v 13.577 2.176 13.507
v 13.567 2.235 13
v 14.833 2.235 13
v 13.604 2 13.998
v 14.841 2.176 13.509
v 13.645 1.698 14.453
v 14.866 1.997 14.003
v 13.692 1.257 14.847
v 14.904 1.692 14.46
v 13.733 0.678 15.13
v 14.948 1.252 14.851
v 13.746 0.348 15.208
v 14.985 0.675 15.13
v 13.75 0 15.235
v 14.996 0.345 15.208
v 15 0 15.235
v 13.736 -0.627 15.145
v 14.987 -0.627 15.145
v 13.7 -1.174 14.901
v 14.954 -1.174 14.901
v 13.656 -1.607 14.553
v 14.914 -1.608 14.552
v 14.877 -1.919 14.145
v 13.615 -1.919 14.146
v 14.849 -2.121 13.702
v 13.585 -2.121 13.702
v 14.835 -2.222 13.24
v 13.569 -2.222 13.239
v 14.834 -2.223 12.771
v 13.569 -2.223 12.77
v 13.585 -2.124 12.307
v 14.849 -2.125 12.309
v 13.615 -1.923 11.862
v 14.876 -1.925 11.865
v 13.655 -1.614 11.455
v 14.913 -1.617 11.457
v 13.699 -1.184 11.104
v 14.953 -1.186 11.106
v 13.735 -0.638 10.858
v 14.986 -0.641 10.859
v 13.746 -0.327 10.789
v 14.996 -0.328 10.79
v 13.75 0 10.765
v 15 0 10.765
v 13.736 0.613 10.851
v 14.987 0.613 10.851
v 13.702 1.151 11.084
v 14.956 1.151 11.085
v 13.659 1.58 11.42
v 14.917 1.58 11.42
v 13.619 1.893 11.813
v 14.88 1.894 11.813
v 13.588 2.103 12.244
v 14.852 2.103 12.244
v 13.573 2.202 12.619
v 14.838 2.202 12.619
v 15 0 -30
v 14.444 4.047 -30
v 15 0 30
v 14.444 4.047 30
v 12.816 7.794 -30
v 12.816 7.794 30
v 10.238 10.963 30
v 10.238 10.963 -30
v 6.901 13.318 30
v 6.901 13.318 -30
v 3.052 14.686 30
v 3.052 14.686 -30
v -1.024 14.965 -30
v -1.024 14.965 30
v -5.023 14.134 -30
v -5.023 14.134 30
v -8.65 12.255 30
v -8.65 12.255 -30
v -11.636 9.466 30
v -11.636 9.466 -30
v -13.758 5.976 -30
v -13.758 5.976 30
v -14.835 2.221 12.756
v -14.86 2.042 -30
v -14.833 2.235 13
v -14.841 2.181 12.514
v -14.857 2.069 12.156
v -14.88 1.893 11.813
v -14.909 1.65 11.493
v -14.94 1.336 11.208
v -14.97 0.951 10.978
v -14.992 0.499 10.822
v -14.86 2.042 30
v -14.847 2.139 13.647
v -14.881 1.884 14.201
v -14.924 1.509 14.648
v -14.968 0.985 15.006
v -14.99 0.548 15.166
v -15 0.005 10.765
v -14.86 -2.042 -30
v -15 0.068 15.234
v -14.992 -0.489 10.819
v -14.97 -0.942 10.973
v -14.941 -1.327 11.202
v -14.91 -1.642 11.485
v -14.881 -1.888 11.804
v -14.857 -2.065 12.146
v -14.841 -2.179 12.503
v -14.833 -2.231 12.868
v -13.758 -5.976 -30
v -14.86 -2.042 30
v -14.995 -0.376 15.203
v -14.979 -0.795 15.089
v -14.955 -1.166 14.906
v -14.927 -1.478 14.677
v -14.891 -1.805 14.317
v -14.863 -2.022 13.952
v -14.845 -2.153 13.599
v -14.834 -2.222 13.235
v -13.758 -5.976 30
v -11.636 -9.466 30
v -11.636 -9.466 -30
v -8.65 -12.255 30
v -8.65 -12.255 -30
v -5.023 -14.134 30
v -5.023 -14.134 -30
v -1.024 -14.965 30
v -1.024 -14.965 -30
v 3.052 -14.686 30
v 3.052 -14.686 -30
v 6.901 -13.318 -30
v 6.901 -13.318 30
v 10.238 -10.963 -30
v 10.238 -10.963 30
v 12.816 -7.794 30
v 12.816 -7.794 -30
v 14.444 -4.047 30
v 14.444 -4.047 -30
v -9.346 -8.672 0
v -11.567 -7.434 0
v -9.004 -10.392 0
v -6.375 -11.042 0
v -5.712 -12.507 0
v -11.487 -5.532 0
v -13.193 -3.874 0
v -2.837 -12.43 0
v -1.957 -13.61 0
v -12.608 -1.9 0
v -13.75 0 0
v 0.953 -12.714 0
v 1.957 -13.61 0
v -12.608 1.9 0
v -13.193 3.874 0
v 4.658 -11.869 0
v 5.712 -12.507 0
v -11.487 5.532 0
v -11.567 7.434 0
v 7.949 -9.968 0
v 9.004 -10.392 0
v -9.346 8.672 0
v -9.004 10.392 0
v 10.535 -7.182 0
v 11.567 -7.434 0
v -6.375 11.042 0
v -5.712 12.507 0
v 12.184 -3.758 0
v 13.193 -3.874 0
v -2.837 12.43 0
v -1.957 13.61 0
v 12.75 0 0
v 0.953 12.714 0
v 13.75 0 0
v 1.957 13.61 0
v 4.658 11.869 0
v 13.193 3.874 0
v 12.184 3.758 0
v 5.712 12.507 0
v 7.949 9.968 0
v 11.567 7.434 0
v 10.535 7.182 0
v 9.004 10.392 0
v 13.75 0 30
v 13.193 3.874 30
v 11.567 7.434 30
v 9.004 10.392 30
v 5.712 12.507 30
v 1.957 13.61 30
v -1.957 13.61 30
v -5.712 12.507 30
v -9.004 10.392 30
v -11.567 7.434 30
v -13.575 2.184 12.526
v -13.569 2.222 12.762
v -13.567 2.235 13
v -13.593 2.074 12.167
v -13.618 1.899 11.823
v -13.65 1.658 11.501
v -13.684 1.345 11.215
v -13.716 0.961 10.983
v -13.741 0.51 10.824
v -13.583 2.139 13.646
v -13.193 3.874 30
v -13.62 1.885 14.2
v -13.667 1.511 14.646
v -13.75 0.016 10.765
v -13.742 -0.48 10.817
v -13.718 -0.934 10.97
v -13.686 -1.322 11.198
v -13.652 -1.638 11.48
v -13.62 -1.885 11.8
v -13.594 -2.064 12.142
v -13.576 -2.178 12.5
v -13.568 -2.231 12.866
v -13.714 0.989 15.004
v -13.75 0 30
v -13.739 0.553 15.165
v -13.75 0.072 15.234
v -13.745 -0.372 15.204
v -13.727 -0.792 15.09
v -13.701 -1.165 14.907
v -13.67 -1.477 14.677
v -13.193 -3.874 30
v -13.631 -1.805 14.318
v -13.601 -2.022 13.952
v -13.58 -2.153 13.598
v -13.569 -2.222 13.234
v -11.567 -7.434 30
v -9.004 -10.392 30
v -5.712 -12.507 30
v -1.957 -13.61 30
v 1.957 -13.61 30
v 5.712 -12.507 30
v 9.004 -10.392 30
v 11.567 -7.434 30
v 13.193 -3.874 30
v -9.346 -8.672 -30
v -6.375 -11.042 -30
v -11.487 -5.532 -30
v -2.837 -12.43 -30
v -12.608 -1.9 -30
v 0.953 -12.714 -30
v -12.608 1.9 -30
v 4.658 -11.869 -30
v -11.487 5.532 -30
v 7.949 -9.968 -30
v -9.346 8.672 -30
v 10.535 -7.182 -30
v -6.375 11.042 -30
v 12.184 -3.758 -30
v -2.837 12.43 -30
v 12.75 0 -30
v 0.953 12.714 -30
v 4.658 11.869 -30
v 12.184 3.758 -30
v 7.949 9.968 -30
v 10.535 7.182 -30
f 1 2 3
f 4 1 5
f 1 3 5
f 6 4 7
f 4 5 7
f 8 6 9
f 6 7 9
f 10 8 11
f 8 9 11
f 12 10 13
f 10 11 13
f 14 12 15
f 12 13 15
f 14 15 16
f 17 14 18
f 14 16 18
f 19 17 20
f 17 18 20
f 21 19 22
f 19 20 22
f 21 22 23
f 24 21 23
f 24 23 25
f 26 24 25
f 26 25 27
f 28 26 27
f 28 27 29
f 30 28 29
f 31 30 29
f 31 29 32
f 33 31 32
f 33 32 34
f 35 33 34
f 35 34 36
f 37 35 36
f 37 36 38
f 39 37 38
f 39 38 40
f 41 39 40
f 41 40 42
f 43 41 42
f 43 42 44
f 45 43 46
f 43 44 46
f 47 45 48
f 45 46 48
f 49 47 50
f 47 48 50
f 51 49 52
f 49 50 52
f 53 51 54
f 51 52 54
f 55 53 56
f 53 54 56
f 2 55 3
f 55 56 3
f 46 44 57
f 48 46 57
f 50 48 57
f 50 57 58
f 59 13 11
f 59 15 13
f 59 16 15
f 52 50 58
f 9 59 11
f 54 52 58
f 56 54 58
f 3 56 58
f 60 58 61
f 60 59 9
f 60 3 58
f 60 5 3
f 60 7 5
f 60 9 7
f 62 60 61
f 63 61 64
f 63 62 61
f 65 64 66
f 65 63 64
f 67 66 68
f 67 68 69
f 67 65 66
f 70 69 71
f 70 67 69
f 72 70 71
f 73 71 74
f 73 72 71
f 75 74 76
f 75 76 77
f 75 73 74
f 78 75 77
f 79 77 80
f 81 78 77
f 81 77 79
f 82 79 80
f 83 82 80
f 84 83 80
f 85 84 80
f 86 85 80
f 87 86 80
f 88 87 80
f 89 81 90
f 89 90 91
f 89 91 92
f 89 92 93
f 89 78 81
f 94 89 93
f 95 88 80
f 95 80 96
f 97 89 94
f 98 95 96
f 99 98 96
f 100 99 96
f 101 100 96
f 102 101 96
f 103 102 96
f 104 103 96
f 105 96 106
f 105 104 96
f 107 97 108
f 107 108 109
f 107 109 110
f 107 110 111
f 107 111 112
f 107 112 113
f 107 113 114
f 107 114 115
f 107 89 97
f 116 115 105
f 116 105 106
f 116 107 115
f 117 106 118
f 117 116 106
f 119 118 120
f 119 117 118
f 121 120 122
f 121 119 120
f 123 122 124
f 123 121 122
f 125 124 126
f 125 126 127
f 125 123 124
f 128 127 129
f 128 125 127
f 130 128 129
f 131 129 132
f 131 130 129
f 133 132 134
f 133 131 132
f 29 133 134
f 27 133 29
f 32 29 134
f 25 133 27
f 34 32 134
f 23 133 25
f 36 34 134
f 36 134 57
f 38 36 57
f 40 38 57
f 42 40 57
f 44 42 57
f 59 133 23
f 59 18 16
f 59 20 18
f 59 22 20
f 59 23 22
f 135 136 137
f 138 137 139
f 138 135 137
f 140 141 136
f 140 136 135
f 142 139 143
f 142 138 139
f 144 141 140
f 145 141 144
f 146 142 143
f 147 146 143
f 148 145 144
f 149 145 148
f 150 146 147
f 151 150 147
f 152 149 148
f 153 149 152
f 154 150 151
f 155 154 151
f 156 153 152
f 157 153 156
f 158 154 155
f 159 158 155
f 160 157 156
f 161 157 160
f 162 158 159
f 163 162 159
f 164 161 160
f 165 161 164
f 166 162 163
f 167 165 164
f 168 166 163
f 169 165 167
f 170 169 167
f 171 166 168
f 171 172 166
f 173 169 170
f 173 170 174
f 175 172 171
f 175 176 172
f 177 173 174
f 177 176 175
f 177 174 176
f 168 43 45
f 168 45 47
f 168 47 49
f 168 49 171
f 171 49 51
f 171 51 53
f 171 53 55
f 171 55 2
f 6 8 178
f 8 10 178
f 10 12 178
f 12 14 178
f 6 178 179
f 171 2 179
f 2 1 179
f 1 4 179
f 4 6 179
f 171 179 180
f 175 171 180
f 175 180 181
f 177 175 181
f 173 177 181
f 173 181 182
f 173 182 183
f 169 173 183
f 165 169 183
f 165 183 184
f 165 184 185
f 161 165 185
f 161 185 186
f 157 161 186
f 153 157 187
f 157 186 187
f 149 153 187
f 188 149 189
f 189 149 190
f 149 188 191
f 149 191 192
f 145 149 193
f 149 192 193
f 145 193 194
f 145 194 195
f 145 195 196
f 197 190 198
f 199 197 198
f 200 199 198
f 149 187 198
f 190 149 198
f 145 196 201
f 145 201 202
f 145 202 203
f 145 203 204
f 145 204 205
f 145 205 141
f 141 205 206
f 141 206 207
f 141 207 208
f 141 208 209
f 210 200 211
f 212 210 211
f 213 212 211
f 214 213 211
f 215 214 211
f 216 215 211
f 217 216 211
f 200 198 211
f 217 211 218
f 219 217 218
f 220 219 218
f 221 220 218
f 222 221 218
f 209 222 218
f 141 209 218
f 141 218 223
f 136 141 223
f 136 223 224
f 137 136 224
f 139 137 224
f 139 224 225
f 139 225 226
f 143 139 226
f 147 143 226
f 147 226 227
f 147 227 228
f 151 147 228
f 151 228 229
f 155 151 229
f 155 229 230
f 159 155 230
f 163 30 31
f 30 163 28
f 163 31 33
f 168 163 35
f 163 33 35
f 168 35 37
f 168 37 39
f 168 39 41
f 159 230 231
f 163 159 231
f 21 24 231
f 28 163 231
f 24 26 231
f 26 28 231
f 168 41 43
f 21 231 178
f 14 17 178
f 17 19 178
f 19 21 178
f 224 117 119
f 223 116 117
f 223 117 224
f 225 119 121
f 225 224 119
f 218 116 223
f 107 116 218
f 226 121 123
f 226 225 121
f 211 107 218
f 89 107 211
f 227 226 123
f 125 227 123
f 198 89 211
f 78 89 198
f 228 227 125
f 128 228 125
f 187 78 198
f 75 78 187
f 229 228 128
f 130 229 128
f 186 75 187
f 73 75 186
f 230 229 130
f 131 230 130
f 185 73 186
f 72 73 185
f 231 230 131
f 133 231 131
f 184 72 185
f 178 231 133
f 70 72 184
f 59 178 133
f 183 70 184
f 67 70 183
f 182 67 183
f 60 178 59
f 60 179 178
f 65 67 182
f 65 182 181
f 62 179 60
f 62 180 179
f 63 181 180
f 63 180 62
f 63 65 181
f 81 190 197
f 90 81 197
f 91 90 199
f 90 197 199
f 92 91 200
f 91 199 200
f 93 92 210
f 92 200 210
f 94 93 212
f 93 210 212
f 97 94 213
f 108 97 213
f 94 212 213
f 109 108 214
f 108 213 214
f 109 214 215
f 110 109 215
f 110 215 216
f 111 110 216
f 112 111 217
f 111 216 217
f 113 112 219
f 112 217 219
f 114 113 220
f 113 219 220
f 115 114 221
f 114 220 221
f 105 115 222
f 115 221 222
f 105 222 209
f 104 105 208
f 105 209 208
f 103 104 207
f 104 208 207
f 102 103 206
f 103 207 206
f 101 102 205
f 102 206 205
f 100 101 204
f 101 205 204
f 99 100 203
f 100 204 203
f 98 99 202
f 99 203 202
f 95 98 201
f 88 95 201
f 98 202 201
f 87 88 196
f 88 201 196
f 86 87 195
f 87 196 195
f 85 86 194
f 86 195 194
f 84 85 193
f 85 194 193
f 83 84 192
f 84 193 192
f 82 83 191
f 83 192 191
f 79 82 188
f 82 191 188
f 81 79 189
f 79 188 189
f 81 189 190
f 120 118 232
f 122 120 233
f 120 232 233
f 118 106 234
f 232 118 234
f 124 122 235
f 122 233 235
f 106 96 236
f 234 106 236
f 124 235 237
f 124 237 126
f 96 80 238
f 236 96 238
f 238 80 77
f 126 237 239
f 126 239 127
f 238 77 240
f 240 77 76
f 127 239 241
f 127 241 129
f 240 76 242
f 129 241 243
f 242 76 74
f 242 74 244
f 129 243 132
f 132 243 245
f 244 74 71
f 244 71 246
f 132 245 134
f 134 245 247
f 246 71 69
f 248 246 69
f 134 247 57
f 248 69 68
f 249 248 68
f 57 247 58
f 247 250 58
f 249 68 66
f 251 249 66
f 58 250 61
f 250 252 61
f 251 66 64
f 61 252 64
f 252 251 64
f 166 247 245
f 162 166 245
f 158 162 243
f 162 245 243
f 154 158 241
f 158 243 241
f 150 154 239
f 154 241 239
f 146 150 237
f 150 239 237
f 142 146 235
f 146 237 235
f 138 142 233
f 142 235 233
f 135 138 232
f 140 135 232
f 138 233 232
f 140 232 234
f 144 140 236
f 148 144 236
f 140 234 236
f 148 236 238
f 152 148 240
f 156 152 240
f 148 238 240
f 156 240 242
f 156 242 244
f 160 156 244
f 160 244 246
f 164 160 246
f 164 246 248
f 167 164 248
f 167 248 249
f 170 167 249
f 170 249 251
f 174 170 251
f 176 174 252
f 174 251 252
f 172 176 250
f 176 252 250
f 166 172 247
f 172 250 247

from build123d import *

# Parameters (mm, degrees)
F0_R     = 15
F0_R_2   = 13.5
F1_DEPTH = 30
F0_R_3   = 12.5
F2_DEPTH = 30
F3_R     = 2.2347042808
F4_DEPTH = 50
F5_R     = 13.75
F6_DEPTH = 30
F7_R     = 12.75
F8_DEPTH = 30


with BuildPart() as f1:
    # F0 (on Top) → F1 (new body)
    with BuildSketch(Plane.XY):
        Circle(F0_R)
        Circle(F0_R_2, mode=Mode.SUBTRACT)
    extrude(amount=F1_DEPTH)

    # F0 (on Top) → F2 (join)
    with BuildSketch(Plane.XY):
        Circle(F0_R)
        Circle(F0_R_2, mode=Mode.SUBTRACT)
        Circle(F0_R_2)
        Circle(F0_R_3, mode=Mode.SUBTRACT)
    extrude(amount=-F2_DEPTH)

    # F3 (on Right) → F4 (cut, symmetric)
    with BuildSketch(Plane.YZ):
        with Locations((0, 13)):
            Circle(F3_R)
    extrude(amount=F4_DEPTH, both=True, mode=Mode.SUBTRACT)

    # F5 (on face) → F6 (cut)
    with BuildSketch(Plane.XY.offset(30)):
        Circle(F5_R)
    extrude(amount=-F6_DEPTH, mode=Mode.SUBTRACT)

    # F7 (on face) → F8 (cut)
    with BuildSketch(Plane(origin=(0, 0, -30), x_dir=(1, 0, 0), z_dir=(0, 0, -1))):
        Circle(F7_R)
    extrude(amount=-F8_DEPTH, mode=Mode.SUBTRACT)


solid = f1.part
